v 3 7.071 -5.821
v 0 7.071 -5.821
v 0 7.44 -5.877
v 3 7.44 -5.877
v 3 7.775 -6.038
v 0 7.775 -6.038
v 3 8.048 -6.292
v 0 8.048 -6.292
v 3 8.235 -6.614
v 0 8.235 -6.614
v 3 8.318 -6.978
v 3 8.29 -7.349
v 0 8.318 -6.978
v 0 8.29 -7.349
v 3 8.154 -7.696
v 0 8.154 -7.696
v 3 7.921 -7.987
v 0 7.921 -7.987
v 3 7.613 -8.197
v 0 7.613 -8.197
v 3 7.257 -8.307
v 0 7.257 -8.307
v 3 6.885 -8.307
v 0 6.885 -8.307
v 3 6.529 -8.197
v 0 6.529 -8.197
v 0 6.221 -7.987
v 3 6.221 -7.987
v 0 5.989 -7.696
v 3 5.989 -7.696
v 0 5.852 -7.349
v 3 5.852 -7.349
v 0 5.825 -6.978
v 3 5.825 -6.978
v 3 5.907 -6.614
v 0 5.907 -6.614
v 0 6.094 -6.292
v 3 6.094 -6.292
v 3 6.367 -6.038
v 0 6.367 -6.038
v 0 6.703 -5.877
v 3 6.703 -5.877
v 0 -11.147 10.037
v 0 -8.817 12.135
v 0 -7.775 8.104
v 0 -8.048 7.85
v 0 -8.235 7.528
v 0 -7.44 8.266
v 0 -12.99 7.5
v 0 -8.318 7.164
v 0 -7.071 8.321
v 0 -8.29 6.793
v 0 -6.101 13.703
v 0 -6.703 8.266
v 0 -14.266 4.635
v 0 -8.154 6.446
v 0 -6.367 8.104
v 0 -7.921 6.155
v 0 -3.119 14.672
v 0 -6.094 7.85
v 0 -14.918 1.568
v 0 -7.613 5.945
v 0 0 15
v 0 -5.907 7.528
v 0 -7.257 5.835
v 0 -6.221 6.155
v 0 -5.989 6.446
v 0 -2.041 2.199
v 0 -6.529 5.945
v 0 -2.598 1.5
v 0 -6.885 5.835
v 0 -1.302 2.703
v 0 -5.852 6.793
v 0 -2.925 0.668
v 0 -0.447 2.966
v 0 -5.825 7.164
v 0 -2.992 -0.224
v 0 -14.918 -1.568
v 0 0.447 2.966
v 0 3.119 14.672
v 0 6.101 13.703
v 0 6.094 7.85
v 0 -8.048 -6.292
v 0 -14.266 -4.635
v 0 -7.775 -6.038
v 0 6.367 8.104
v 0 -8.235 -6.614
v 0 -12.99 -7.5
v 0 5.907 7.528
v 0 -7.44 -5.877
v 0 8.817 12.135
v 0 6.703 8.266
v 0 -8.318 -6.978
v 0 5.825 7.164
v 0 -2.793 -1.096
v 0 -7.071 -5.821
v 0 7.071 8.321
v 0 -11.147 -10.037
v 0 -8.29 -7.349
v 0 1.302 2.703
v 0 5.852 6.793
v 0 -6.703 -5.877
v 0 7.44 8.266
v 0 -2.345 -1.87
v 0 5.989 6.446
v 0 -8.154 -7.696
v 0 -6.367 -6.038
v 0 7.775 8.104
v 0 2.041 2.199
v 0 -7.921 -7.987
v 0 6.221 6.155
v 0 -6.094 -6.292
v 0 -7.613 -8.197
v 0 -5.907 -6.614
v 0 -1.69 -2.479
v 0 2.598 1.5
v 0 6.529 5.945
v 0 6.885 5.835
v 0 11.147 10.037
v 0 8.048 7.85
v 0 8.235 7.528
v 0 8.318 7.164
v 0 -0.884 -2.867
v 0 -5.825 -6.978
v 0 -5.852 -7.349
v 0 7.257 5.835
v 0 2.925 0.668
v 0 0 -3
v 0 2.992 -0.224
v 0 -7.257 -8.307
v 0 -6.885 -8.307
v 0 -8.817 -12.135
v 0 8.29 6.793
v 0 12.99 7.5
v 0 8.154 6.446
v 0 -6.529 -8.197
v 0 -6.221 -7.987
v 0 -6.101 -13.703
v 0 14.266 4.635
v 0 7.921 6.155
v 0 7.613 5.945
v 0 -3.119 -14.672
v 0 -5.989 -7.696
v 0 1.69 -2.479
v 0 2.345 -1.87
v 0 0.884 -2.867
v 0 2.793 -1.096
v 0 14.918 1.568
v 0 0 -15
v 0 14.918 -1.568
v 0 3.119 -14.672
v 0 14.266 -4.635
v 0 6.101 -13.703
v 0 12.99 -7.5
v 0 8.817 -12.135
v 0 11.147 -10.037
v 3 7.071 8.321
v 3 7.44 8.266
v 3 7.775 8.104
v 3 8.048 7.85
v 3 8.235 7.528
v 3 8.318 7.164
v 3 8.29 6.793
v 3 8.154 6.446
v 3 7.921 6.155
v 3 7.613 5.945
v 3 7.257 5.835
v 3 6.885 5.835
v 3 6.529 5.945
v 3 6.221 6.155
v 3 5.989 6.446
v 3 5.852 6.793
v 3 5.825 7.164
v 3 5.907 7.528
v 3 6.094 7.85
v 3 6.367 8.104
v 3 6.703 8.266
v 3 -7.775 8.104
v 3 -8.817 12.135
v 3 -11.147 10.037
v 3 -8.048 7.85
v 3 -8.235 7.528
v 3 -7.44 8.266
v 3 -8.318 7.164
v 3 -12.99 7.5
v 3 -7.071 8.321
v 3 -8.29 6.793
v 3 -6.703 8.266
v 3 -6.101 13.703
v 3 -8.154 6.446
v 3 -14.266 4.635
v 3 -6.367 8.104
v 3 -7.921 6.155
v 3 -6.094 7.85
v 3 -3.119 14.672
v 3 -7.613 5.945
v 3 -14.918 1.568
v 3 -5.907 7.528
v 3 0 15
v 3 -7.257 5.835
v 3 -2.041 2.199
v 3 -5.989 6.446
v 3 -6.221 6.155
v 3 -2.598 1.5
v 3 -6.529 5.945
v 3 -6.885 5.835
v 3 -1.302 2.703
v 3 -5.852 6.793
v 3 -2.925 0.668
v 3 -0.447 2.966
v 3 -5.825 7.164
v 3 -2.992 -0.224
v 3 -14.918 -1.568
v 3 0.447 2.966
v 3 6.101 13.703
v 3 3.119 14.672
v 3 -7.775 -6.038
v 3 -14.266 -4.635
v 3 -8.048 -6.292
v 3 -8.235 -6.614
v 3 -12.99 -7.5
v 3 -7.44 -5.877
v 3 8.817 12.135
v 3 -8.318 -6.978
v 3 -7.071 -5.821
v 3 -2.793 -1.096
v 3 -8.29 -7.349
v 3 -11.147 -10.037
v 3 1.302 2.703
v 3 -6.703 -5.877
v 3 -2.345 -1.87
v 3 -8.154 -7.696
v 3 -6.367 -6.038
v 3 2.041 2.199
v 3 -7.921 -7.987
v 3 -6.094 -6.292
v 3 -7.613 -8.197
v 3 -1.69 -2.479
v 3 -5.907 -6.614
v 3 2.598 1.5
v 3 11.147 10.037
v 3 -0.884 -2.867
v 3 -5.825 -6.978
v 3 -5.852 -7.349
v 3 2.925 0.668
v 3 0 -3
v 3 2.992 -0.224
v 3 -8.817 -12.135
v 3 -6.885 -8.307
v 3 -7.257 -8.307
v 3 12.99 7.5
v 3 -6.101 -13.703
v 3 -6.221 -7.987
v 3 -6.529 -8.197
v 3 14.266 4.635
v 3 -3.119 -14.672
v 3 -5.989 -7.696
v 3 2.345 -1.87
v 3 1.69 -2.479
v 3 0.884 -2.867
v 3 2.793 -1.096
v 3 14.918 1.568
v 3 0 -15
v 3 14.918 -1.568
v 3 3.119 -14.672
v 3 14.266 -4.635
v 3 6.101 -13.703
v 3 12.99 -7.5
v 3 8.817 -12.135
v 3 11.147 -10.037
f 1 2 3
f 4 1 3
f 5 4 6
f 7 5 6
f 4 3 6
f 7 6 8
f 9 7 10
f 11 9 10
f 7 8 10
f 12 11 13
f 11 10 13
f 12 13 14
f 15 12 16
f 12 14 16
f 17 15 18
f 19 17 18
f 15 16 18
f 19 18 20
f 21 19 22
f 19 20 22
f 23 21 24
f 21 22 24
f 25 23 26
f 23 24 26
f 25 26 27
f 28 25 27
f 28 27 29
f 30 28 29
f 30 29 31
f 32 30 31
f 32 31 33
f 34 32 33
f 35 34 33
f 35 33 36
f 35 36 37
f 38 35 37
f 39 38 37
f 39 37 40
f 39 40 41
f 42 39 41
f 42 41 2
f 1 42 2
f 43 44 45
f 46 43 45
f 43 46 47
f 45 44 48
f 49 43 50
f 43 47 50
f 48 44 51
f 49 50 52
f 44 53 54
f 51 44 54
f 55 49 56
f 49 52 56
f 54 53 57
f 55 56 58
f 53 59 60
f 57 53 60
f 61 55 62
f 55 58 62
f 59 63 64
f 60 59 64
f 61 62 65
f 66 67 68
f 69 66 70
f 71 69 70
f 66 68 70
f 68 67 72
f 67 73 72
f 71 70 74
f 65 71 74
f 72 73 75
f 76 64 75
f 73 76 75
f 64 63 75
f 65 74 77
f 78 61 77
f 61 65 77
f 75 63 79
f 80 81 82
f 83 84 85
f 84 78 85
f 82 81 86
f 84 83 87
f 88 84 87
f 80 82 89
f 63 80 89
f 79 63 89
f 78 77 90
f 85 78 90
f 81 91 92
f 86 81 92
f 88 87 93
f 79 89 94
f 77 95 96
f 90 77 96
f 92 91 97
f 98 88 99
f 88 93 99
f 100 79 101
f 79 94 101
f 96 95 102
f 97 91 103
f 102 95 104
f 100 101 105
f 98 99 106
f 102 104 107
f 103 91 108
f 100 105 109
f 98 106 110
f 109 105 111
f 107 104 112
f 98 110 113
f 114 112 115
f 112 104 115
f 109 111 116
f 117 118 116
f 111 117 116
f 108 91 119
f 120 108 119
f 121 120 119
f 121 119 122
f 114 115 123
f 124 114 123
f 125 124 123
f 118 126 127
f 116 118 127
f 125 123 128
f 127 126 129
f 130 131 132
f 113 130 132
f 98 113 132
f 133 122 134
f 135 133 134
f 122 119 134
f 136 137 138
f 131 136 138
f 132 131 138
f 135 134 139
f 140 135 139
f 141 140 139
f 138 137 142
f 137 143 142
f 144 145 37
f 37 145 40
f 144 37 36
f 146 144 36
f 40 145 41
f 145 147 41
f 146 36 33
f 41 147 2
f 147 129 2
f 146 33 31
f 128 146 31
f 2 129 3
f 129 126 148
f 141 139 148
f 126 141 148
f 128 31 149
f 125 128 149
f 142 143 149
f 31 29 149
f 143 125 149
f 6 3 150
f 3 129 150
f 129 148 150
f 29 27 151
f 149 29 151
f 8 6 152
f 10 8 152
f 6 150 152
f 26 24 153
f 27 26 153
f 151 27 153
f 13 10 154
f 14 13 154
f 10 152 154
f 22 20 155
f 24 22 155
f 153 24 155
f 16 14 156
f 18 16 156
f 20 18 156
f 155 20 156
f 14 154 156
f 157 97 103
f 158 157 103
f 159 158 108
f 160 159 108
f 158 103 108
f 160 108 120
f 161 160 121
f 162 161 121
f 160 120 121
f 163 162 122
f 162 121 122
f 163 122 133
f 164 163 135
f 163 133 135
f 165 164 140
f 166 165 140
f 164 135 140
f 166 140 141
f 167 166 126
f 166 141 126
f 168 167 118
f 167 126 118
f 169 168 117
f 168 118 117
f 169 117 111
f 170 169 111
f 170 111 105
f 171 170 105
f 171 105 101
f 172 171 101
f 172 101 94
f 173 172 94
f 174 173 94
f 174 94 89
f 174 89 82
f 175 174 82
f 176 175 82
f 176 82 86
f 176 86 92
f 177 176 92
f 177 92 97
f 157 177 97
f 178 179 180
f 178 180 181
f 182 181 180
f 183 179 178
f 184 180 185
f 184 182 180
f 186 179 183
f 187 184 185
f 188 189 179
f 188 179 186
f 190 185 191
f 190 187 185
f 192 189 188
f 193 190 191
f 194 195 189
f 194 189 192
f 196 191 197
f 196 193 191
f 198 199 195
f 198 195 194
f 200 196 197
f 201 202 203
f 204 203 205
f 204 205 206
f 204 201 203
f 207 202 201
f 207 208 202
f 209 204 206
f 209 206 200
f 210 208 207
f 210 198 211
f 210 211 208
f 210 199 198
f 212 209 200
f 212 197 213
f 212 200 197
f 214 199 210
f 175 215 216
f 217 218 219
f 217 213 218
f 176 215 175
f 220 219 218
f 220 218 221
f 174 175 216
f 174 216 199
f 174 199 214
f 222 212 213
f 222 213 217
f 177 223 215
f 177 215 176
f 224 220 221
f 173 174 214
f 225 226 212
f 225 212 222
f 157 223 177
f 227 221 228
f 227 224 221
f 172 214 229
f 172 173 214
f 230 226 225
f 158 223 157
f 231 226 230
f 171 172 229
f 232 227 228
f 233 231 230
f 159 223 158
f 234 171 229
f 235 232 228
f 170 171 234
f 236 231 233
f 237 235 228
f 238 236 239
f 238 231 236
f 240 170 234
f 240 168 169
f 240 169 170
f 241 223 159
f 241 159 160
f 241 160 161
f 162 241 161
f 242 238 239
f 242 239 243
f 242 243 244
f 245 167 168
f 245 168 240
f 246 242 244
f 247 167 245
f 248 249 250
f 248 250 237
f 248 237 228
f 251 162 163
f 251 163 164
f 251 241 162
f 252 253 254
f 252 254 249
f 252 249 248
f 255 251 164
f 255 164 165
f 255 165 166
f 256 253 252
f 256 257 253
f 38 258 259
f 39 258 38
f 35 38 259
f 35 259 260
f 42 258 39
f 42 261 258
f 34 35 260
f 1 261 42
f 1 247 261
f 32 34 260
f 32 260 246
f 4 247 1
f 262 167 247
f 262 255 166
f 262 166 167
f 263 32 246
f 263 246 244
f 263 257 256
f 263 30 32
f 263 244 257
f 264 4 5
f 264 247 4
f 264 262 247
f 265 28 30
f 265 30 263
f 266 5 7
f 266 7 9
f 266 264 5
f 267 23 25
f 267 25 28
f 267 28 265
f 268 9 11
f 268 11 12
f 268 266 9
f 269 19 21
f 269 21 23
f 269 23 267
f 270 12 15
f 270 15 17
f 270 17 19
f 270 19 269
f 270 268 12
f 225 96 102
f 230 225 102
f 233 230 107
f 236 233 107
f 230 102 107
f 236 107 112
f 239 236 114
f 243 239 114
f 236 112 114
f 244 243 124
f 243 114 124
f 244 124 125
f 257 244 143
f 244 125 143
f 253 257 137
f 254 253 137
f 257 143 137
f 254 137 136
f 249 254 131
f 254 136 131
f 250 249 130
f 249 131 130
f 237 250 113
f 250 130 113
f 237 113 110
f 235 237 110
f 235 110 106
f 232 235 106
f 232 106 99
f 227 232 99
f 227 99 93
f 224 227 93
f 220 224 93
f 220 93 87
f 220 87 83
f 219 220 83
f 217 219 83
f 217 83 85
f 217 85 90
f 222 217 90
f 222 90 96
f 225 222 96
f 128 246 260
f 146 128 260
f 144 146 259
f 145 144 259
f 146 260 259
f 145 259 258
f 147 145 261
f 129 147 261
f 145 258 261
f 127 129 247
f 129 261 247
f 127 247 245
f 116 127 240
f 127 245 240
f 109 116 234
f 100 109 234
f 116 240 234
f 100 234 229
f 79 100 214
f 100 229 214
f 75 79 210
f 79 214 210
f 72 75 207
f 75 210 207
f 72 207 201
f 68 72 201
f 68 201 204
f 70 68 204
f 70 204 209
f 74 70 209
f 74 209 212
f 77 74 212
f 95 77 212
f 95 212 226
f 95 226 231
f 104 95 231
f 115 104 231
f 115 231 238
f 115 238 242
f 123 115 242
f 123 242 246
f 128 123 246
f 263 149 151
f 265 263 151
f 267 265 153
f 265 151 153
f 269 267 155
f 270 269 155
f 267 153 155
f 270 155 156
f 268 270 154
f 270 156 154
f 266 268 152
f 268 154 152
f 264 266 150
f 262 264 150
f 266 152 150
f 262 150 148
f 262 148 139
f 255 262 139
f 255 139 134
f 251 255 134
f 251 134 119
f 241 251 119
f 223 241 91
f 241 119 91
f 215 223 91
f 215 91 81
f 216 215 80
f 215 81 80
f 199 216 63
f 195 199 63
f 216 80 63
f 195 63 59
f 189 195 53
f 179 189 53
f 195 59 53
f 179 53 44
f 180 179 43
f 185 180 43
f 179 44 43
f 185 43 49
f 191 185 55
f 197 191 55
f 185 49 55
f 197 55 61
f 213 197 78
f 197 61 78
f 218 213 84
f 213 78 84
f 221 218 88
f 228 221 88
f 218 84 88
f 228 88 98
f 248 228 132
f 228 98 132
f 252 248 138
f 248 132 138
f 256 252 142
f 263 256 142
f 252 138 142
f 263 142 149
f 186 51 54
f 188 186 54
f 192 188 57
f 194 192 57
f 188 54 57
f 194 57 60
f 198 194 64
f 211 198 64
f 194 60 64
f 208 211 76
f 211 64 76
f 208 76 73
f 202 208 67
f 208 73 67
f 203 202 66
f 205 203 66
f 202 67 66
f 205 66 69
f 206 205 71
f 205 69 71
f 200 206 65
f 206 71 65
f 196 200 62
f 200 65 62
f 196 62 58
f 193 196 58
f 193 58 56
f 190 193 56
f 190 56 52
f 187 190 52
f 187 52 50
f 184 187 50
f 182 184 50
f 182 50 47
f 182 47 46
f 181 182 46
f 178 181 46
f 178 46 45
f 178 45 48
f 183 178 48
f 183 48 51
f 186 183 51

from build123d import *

# Parameters (mm, degrees)
SKETCH_1_R          = 15
EXTRUDE_1_DEPTH     = 3
M3X0_5_1_D          = 2.5
SKETCH_6_R          = 3
CUT_EXTRUDE_2_DEPTH = 22.424285286


with BuildPart() as part:
    # ｽｹｯﾁ1 → ﾎﾞｽ - 押し出し1 (new body)
    with BuildSketch(Plane(origin=(0, 0, 0), x_dir=(0, 0, -1), z_dir=(1, 0, 0))):
        Circle(SKETCH_1_R)
    extrude(amount=EXTRUDE_1_DEPTH)

    # M3x0.5 ねじ穴1 (through all)
    with Locations(Plane(origin=(3, 0, 0), x_dir=(0, 0, -1), z_dir=(1, 0, 0))):
        with Locations((-7.071067812, 7.071067812), (7.071067812, -7.071067812), (7.071067812, 7.071067812), (-7.071067812, -7.071067812)):
            Hole(M3X0_5_1_D / 2)

    # ｽｹｯﾁ6 → ｶｯﾄ - 押し出し2 (cut, through all)
    with BuildSketch(Plane(origin=(3, 0, 0), x_dir=(0, 0, -1), z_dir=(1, 0, 0))):
        Circle(SKETCH_6_R)
    extrude(amount=-CUT_EXTRUDE_2_DEPTH, mode=Mode.SUBTRACT)


solid = part.part
